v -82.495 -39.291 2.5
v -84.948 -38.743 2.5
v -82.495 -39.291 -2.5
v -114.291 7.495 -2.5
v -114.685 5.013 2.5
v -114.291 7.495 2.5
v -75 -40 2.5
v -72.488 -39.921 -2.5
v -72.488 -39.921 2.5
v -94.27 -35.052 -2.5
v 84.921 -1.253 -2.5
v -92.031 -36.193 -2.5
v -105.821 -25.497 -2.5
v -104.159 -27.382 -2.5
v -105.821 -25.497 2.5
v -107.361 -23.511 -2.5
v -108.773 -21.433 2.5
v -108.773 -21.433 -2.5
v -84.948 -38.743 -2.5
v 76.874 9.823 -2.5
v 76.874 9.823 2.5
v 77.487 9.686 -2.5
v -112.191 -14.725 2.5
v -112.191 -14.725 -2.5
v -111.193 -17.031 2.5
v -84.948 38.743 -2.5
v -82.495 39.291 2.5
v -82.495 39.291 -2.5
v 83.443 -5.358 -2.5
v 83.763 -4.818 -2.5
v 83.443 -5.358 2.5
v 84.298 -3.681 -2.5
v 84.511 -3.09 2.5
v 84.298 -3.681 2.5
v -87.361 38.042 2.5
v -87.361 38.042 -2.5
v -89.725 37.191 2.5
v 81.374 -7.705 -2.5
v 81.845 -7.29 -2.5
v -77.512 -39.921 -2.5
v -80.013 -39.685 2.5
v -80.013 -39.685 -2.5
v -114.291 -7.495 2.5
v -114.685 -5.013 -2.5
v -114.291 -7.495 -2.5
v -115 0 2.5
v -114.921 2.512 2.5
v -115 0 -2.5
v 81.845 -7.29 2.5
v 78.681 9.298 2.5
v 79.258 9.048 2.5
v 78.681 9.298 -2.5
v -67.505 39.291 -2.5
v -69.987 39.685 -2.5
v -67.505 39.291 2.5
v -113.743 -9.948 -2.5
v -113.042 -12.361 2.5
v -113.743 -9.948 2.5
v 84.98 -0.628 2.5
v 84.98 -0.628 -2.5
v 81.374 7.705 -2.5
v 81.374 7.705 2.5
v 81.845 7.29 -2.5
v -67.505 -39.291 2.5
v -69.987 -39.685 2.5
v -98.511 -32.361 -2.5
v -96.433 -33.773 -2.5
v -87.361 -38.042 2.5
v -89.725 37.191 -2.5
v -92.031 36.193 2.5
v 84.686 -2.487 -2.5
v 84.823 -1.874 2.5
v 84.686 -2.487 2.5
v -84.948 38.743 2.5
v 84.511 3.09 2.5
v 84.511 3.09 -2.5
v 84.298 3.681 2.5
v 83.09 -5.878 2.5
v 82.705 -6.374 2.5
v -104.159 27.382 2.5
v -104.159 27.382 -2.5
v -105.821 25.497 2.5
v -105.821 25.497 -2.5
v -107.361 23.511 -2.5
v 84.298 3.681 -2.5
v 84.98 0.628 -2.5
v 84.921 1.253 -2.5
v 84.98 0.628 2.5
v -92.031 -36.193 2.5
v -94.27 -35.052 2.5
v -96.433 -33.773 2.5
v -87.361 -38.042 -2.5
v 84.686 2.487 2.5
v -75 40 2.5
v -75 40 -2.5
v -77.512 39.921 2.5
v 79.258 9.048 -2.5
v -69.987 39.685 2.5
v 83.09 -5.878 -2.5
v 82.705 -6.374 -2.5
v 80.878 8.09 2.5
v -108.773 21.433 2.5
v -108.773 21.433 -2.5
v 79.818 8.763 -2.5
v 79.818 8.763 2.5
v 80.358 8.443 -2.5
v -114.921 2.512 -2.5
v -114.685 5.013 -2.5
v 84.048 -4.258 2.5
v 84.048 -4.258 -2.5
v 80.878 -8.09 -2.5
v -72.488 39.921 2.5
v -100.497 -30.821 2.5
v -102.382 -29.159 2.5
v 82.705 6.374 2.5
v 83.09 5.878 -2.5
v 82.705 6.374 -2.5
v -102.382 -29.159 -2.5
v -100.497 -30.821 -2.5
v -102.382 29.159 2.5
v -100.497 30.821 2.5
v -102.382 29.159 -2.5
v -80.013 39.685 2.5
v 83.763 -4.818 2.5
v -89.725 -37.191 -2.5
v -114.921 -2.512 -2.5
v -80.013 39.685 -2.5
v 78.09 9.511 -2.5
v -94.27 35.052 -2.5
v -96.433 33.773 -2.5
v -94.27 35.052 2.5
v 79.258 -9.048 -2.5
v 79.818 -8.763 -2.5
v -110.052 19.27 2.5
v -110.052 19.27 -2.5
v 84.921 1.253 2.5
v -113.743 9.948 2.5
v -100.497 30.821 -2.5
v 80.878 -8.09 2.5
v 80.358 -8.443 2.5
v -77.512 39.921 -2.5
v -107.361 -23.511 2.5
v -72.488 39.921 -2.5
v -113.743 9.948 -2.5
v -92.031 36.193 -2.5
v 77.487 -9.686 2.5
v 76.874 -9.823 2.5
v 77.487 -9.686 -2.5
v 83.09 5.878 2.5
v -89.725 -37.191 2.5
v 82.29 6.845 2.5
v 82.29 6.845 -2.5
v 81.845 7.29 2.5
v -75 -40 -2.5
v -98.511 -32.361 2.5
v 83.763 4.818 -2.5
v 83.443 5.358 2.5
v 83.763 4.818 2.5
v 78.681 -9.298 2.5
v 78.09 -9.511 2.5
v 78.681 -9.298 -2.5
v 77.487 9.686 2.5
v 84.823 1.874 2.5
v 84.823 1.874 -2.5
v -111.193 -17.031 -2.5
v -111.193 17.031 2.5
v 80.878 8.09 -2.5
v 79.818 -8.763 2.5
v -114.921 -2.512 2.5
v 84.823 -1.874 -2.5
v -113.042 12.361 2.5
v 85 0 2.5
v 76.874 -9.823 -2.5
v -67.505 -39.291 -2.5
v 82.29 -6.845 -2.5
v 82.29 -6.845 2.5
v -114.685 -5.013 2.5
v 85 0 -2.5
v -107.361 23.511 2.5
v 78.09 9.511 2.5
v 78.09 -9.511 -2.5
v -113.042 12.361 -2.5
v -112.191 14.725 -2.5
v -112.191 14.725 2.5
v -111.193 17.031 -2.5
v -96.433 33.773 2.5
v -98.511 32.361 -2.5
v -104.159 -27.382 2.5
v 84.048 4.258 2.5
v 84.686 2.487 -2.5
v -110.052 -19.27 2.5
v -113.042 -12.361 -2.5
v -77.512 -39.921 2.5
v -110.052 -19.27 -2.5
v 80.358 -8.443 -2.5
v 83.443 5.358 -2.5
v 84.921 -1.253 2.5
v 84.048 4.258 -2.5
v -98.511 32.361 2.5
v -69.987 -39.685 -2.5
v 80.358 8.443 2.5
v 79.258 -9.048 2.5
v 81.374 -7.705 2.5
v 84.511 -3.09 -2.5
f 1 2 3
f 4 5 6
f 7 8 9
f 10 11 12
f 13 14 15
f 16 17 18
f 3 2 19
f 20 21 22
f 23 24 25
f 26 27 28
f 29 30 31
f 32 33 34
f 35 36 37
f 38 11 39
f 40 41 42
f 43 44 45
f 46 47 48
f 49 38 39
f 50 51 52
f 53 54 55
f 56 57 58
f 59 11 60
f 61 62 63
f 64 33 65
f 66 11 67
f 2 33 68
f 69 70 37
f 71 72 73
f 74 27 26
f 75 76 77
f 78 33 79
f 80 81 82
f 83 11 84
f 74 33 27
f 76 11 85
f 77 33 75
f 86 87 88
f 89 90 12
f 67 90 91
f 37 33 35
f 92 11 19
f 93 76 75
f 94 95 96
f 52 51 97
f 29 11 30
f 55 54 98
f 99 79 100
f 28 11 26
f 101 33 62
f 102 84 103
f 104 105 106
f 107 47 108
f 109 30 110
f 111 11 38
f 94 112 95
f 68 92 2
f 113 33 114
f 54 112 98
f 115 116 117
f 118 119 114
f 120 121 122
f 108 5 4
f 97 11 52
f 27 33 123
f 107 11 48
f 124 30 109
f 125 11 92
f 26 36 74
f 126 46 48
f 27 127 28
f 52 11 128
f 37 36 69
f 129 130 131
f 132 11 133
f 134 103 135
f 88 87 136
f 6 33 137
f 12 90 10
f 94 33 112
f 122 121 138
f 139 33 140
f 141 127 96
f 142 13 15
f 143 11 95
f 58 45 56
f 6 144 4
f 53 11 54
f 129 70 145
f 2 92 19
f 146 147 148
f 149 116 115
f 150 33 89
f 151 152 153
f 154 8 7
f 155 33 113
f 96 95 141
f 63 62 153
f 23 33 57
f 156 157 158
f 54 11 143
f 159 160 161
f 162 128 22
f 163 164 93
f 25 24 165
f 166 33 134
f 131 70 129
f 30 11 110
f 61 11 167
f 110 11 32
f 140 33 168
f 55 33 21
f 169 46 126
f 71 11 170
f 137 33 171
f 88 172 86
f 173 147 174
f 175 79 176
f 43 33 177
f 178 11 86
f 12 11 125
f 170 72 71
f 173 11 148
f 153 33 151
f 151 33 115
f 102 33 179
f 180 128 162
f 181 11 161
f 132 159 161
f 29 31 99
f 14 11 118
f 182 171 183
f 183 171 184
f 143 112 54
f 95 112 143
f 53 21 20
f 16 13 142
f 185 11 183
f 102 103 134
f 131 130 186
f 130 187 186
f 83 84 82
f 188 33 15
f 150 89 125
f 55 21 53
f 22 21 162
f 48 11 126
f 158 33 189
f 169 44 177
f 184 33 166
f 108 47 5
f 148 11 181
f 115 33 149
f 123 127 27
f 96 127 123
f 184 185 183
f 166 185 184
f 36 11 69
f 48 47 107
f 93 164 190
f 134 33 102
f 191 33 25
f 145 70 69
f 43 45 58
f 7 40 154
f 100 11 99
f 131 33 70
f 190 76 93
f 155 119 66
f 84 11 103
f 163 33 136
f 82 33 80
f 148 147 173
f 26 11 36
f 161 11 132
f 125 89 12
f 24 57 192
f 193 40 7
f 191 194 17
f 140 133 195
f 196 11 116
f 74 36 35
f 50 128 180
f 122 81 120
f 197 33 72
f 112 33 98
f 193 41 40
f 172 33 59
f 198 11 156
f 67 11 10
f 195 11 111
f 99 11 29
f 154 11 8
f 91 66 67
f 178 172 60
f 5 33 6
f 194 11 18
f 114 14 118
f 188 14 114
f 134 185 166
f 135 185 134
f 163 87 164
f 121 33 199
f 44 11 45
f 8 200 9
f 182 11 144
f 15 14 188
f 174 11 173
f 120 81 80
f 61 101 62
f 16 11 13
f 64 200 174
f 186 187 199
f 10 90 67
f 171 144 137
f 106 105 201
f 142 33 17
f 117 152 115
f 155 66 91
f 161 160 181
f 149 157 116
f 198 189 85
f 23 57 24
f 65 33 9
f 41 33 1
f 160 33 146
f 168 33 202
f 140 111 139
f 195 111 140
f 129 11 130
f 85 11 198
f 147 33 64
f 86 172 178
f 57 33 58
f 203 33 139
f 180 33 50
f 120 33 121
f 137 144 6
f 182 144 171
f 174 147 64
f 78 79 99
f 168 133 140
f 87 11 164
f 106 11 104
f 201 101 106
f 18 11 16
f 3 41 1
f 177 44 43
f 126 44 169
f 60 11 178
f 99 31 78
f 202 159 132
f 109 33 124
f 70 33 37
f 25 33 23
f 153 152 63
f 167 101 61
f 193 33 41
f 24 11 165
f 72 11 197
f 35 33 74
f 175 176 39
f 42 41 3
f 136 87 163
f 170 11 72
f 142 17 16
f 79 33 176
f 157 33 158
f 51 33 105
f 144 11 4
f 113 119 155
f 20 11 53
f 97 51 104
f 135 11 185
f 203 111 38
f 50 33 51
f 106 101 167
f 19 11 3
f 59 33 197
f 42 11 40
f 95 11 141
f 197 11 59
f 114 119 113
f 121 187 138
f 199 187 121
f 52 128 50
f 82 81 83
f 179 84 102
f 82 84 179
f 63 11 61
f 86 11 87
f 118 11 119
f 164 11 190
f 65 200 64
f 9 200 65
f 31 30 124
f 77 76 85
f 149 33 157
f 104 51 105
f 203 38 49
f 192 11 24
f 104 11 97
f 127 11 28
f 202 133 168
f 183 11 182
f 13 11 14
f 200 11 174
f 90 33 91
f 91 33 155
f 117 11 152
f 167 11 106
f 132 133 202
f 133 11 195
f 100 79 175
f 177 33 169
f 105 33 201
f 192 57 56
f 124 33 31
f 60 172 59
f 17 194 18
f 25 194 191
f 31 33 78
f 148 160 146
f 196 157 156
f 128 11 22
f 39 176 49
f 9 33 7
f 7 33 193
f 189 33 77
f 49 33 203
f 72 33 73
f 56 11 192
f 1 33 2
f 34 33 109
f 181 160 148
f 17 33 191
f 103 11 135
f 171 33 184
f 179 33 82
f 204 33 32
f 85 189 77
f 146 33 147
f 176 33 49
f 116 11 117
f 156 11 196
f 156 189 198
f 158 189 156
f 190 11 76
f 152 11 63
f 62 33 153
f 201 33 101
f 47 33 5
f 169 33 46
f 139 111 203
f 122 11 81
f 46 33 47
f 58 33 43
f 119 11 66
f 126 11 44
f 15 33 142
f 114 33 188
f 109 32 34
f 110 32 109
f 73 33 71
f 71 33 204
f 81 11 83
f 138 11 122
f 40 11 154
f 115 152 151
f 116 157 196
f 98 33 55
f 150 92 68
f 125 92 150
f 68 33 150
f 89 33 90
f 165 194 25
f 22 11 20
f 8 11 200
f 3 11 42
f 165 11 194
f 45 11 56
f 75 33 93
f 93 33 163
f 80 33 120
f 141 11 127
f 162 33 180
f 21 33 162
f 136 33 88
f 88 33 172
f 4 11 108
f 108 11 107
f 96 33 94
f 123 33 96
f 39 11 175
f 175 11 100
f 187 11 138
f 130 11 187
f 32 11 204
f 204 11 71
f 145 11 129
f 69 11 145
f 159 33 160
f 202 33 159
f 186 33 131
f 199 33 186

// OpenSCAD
// Este es un ejemplo de uso de las tangentes.
r1 = 40;        // Cilindro grande
r2 = 10;        // Cilindro pequeño
th = 5;         // Altura de los cilindros
d  = r1 +r2 + 100;   // Distancia entre los cilindros


hull(){
translate([-d/2, 0, 0])
    cylinder(r = r1, h = th, $fn = 100, center = true);
    
translate([d/2, 0, 0])
    cylinder(r = r2, h = th, $fn = 100, center = true);
    
}
